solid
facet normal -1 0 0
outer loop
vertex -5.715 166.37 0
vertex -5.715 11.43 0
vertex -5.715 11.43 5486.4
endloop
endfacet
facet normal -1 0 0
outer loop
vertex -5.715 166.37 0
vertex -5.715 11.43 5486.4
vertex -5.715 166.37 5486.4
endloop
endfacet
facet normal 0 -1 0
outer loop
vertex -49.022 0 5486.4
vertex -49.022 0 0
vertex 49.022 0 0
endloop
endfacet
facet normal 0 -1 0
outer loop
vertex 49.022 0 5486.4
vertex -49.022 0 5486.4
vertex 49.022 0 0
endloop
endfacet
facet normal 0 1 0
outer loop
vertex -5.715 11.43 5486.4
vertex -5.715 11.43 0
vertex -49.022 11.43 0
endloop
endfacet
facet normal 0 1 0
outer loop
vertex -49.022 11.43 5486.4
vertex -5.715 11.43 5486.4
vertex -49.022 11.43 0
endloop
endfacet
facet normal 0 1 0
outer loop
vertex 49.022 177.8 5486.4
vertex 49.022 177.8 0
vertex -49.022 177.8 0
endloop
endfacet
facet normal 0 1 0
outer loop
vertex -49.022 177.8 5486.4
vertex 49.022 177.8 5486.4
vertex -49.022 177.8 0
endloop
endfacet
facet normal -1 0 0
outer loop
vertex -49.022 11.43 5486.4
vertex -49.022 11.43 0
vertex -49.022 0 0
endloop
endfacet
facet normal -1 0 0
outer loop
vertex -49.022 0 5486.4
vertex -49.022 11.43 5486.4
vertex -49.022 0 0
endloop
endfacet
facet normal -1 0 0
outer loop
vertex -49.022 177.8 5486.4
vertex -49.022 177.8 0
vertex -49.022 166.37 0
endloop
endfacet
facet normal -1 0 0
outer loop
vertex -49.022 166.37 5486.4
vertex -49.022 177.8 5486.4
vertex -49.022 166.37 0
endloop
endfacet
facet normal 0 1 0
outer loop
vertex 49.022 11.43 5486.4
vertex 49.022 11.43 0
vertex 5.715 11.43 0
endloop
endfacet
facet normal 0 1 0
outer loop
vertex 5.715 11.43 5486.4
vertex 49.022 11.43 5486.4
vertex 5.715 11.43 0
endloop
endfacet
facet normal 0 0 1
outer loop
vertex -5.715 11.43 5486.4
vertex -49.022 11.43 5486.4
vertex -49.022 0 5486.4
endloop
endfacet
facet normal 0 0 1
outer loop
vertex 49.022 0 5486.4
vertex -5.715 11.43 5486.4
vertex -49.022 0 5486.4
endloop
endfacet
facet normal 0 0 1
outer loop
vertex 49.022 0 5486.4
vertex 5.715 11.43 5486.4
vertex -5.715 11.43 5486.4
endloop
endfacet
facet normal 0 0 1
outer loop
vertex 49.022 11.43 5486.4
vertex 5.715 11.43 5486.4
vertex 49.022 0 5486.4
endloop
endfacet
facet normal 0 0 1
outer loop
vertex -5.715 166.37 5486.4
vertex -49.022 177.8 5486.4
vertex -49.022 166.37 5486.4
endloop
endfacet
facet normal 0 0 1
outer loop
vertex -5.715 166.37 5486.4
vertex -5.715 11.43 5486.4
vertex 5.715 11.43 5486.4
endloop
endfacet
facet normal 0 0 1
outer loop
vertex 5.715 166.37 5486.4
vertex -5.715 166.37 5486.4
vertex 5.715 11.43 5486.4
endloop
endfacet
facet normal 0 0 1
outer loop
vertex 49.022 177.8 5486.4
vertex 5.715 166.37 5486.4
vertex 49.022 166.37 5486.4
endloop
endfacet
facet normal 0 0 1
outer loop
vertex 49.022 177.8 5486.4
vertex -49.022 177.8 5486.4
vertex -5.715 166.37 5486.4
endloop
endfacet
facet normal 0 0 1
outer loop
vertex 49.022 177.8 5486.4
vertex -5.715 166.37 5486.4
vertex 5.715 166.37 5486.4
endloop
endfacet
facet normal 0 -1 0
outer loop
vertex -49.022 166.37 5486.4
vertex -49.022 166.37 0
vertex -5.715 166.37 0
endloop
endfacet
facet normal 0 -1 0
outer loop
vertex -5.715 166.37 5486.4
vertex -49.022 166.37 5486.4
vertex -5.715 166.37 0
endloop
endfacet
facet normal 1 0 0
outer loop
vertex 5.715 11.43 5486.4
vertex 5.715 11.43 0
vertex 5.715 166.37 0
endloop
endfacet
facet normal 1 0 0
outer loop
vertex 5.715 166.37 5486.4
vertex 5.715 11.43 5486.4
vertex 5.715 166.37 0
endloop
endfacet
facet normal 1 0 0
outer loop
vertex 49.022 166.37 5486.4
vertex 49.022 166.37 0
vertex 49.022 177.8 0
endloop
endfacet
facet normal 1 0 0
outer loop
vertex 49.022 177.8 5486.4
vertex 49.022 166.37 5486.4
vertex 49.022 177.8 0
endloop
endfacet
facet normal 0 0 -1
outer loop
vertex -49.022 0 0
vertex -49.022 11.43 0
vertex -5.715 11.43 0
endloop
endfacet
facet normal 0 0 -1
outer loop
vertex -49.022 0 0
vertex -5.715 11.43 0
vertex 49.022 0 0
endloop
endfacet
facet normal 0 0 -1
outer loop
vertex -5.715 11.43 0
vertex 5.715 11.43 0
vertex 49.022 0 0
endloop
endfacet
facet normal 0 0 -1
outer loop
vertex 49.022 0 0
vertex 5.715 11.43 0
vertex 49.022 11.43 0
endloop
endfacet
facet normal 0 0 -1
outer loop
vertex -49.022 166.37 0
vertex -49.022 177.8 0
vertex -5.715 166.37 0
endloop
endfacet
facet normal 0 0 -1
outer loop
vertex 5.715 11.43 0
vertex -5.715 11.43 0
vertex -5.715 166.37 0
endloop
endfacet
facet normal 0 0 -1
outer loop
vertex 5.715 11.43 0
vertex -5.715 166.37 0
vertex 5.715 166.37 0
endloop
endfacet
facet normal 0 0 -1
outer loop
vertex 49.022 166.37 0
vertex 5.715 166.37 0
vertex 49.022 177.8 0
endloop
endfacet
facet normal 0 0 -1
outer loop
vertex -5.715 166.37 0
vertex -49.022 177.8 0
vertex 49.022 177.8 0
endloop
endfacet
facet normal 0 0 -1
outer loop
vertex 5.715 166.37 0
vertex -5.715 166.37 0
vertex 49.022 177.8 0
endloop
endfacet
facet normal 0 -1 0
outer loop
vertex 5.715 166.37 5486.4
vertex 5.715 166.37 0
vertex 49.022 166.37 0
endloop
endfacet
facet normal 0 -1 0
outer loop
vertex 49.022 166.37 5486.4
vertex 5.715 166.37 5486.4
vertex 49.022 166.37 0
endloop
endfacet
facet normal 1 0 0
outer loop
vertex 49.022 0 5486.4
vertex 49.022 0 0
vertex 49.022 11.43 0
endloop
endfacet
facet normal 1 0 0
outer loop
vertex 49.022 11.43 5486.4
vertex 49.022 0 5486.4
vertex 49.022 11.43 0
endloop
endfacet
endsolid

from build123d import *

# Parameters (mm, degrees)
SKETCH2_W           = 5.715
SKETCH2_H           = 154.94
BOSS_EXTRUDE1_DEPTH = 5486.4


with BuildPart() as part:
    # Sketch2 → Boss-Extrude1 (new body)
    with BuildSketch(Plane.XY):
        Polygon((-5.715, 166.37), (0, 166.37), (0, 177.8), (-49.022, 177.8), (-49.022, 166.37), align=None)
        Polygon((0, 177.8), (0, 166.37), (5.715, 166.37), (49.022, 166.37), (49.022, 177.8), align=None)
        with Locations((2.8575, 88.9)):
            Rectangle(SKETCH2_W, SKETCH2_H)
        with Locations((-2.8575, 88.9)):
            Rectangle(SKETCH2_W, SKETCH2_H)
        Polygon((-49.022, 11.43), (-49.022, 0), (0, 0), (0, 11.43), (-5.715, 11.43), align=None)
        Polygon((0, 11.43), (0, 0), (49.022, 0), (49.022, 11.43), (5.715, 11.43), align=None)
    extrude(amount=BOSS_EXTRUDE1_DEPTH)


solid = part.part
